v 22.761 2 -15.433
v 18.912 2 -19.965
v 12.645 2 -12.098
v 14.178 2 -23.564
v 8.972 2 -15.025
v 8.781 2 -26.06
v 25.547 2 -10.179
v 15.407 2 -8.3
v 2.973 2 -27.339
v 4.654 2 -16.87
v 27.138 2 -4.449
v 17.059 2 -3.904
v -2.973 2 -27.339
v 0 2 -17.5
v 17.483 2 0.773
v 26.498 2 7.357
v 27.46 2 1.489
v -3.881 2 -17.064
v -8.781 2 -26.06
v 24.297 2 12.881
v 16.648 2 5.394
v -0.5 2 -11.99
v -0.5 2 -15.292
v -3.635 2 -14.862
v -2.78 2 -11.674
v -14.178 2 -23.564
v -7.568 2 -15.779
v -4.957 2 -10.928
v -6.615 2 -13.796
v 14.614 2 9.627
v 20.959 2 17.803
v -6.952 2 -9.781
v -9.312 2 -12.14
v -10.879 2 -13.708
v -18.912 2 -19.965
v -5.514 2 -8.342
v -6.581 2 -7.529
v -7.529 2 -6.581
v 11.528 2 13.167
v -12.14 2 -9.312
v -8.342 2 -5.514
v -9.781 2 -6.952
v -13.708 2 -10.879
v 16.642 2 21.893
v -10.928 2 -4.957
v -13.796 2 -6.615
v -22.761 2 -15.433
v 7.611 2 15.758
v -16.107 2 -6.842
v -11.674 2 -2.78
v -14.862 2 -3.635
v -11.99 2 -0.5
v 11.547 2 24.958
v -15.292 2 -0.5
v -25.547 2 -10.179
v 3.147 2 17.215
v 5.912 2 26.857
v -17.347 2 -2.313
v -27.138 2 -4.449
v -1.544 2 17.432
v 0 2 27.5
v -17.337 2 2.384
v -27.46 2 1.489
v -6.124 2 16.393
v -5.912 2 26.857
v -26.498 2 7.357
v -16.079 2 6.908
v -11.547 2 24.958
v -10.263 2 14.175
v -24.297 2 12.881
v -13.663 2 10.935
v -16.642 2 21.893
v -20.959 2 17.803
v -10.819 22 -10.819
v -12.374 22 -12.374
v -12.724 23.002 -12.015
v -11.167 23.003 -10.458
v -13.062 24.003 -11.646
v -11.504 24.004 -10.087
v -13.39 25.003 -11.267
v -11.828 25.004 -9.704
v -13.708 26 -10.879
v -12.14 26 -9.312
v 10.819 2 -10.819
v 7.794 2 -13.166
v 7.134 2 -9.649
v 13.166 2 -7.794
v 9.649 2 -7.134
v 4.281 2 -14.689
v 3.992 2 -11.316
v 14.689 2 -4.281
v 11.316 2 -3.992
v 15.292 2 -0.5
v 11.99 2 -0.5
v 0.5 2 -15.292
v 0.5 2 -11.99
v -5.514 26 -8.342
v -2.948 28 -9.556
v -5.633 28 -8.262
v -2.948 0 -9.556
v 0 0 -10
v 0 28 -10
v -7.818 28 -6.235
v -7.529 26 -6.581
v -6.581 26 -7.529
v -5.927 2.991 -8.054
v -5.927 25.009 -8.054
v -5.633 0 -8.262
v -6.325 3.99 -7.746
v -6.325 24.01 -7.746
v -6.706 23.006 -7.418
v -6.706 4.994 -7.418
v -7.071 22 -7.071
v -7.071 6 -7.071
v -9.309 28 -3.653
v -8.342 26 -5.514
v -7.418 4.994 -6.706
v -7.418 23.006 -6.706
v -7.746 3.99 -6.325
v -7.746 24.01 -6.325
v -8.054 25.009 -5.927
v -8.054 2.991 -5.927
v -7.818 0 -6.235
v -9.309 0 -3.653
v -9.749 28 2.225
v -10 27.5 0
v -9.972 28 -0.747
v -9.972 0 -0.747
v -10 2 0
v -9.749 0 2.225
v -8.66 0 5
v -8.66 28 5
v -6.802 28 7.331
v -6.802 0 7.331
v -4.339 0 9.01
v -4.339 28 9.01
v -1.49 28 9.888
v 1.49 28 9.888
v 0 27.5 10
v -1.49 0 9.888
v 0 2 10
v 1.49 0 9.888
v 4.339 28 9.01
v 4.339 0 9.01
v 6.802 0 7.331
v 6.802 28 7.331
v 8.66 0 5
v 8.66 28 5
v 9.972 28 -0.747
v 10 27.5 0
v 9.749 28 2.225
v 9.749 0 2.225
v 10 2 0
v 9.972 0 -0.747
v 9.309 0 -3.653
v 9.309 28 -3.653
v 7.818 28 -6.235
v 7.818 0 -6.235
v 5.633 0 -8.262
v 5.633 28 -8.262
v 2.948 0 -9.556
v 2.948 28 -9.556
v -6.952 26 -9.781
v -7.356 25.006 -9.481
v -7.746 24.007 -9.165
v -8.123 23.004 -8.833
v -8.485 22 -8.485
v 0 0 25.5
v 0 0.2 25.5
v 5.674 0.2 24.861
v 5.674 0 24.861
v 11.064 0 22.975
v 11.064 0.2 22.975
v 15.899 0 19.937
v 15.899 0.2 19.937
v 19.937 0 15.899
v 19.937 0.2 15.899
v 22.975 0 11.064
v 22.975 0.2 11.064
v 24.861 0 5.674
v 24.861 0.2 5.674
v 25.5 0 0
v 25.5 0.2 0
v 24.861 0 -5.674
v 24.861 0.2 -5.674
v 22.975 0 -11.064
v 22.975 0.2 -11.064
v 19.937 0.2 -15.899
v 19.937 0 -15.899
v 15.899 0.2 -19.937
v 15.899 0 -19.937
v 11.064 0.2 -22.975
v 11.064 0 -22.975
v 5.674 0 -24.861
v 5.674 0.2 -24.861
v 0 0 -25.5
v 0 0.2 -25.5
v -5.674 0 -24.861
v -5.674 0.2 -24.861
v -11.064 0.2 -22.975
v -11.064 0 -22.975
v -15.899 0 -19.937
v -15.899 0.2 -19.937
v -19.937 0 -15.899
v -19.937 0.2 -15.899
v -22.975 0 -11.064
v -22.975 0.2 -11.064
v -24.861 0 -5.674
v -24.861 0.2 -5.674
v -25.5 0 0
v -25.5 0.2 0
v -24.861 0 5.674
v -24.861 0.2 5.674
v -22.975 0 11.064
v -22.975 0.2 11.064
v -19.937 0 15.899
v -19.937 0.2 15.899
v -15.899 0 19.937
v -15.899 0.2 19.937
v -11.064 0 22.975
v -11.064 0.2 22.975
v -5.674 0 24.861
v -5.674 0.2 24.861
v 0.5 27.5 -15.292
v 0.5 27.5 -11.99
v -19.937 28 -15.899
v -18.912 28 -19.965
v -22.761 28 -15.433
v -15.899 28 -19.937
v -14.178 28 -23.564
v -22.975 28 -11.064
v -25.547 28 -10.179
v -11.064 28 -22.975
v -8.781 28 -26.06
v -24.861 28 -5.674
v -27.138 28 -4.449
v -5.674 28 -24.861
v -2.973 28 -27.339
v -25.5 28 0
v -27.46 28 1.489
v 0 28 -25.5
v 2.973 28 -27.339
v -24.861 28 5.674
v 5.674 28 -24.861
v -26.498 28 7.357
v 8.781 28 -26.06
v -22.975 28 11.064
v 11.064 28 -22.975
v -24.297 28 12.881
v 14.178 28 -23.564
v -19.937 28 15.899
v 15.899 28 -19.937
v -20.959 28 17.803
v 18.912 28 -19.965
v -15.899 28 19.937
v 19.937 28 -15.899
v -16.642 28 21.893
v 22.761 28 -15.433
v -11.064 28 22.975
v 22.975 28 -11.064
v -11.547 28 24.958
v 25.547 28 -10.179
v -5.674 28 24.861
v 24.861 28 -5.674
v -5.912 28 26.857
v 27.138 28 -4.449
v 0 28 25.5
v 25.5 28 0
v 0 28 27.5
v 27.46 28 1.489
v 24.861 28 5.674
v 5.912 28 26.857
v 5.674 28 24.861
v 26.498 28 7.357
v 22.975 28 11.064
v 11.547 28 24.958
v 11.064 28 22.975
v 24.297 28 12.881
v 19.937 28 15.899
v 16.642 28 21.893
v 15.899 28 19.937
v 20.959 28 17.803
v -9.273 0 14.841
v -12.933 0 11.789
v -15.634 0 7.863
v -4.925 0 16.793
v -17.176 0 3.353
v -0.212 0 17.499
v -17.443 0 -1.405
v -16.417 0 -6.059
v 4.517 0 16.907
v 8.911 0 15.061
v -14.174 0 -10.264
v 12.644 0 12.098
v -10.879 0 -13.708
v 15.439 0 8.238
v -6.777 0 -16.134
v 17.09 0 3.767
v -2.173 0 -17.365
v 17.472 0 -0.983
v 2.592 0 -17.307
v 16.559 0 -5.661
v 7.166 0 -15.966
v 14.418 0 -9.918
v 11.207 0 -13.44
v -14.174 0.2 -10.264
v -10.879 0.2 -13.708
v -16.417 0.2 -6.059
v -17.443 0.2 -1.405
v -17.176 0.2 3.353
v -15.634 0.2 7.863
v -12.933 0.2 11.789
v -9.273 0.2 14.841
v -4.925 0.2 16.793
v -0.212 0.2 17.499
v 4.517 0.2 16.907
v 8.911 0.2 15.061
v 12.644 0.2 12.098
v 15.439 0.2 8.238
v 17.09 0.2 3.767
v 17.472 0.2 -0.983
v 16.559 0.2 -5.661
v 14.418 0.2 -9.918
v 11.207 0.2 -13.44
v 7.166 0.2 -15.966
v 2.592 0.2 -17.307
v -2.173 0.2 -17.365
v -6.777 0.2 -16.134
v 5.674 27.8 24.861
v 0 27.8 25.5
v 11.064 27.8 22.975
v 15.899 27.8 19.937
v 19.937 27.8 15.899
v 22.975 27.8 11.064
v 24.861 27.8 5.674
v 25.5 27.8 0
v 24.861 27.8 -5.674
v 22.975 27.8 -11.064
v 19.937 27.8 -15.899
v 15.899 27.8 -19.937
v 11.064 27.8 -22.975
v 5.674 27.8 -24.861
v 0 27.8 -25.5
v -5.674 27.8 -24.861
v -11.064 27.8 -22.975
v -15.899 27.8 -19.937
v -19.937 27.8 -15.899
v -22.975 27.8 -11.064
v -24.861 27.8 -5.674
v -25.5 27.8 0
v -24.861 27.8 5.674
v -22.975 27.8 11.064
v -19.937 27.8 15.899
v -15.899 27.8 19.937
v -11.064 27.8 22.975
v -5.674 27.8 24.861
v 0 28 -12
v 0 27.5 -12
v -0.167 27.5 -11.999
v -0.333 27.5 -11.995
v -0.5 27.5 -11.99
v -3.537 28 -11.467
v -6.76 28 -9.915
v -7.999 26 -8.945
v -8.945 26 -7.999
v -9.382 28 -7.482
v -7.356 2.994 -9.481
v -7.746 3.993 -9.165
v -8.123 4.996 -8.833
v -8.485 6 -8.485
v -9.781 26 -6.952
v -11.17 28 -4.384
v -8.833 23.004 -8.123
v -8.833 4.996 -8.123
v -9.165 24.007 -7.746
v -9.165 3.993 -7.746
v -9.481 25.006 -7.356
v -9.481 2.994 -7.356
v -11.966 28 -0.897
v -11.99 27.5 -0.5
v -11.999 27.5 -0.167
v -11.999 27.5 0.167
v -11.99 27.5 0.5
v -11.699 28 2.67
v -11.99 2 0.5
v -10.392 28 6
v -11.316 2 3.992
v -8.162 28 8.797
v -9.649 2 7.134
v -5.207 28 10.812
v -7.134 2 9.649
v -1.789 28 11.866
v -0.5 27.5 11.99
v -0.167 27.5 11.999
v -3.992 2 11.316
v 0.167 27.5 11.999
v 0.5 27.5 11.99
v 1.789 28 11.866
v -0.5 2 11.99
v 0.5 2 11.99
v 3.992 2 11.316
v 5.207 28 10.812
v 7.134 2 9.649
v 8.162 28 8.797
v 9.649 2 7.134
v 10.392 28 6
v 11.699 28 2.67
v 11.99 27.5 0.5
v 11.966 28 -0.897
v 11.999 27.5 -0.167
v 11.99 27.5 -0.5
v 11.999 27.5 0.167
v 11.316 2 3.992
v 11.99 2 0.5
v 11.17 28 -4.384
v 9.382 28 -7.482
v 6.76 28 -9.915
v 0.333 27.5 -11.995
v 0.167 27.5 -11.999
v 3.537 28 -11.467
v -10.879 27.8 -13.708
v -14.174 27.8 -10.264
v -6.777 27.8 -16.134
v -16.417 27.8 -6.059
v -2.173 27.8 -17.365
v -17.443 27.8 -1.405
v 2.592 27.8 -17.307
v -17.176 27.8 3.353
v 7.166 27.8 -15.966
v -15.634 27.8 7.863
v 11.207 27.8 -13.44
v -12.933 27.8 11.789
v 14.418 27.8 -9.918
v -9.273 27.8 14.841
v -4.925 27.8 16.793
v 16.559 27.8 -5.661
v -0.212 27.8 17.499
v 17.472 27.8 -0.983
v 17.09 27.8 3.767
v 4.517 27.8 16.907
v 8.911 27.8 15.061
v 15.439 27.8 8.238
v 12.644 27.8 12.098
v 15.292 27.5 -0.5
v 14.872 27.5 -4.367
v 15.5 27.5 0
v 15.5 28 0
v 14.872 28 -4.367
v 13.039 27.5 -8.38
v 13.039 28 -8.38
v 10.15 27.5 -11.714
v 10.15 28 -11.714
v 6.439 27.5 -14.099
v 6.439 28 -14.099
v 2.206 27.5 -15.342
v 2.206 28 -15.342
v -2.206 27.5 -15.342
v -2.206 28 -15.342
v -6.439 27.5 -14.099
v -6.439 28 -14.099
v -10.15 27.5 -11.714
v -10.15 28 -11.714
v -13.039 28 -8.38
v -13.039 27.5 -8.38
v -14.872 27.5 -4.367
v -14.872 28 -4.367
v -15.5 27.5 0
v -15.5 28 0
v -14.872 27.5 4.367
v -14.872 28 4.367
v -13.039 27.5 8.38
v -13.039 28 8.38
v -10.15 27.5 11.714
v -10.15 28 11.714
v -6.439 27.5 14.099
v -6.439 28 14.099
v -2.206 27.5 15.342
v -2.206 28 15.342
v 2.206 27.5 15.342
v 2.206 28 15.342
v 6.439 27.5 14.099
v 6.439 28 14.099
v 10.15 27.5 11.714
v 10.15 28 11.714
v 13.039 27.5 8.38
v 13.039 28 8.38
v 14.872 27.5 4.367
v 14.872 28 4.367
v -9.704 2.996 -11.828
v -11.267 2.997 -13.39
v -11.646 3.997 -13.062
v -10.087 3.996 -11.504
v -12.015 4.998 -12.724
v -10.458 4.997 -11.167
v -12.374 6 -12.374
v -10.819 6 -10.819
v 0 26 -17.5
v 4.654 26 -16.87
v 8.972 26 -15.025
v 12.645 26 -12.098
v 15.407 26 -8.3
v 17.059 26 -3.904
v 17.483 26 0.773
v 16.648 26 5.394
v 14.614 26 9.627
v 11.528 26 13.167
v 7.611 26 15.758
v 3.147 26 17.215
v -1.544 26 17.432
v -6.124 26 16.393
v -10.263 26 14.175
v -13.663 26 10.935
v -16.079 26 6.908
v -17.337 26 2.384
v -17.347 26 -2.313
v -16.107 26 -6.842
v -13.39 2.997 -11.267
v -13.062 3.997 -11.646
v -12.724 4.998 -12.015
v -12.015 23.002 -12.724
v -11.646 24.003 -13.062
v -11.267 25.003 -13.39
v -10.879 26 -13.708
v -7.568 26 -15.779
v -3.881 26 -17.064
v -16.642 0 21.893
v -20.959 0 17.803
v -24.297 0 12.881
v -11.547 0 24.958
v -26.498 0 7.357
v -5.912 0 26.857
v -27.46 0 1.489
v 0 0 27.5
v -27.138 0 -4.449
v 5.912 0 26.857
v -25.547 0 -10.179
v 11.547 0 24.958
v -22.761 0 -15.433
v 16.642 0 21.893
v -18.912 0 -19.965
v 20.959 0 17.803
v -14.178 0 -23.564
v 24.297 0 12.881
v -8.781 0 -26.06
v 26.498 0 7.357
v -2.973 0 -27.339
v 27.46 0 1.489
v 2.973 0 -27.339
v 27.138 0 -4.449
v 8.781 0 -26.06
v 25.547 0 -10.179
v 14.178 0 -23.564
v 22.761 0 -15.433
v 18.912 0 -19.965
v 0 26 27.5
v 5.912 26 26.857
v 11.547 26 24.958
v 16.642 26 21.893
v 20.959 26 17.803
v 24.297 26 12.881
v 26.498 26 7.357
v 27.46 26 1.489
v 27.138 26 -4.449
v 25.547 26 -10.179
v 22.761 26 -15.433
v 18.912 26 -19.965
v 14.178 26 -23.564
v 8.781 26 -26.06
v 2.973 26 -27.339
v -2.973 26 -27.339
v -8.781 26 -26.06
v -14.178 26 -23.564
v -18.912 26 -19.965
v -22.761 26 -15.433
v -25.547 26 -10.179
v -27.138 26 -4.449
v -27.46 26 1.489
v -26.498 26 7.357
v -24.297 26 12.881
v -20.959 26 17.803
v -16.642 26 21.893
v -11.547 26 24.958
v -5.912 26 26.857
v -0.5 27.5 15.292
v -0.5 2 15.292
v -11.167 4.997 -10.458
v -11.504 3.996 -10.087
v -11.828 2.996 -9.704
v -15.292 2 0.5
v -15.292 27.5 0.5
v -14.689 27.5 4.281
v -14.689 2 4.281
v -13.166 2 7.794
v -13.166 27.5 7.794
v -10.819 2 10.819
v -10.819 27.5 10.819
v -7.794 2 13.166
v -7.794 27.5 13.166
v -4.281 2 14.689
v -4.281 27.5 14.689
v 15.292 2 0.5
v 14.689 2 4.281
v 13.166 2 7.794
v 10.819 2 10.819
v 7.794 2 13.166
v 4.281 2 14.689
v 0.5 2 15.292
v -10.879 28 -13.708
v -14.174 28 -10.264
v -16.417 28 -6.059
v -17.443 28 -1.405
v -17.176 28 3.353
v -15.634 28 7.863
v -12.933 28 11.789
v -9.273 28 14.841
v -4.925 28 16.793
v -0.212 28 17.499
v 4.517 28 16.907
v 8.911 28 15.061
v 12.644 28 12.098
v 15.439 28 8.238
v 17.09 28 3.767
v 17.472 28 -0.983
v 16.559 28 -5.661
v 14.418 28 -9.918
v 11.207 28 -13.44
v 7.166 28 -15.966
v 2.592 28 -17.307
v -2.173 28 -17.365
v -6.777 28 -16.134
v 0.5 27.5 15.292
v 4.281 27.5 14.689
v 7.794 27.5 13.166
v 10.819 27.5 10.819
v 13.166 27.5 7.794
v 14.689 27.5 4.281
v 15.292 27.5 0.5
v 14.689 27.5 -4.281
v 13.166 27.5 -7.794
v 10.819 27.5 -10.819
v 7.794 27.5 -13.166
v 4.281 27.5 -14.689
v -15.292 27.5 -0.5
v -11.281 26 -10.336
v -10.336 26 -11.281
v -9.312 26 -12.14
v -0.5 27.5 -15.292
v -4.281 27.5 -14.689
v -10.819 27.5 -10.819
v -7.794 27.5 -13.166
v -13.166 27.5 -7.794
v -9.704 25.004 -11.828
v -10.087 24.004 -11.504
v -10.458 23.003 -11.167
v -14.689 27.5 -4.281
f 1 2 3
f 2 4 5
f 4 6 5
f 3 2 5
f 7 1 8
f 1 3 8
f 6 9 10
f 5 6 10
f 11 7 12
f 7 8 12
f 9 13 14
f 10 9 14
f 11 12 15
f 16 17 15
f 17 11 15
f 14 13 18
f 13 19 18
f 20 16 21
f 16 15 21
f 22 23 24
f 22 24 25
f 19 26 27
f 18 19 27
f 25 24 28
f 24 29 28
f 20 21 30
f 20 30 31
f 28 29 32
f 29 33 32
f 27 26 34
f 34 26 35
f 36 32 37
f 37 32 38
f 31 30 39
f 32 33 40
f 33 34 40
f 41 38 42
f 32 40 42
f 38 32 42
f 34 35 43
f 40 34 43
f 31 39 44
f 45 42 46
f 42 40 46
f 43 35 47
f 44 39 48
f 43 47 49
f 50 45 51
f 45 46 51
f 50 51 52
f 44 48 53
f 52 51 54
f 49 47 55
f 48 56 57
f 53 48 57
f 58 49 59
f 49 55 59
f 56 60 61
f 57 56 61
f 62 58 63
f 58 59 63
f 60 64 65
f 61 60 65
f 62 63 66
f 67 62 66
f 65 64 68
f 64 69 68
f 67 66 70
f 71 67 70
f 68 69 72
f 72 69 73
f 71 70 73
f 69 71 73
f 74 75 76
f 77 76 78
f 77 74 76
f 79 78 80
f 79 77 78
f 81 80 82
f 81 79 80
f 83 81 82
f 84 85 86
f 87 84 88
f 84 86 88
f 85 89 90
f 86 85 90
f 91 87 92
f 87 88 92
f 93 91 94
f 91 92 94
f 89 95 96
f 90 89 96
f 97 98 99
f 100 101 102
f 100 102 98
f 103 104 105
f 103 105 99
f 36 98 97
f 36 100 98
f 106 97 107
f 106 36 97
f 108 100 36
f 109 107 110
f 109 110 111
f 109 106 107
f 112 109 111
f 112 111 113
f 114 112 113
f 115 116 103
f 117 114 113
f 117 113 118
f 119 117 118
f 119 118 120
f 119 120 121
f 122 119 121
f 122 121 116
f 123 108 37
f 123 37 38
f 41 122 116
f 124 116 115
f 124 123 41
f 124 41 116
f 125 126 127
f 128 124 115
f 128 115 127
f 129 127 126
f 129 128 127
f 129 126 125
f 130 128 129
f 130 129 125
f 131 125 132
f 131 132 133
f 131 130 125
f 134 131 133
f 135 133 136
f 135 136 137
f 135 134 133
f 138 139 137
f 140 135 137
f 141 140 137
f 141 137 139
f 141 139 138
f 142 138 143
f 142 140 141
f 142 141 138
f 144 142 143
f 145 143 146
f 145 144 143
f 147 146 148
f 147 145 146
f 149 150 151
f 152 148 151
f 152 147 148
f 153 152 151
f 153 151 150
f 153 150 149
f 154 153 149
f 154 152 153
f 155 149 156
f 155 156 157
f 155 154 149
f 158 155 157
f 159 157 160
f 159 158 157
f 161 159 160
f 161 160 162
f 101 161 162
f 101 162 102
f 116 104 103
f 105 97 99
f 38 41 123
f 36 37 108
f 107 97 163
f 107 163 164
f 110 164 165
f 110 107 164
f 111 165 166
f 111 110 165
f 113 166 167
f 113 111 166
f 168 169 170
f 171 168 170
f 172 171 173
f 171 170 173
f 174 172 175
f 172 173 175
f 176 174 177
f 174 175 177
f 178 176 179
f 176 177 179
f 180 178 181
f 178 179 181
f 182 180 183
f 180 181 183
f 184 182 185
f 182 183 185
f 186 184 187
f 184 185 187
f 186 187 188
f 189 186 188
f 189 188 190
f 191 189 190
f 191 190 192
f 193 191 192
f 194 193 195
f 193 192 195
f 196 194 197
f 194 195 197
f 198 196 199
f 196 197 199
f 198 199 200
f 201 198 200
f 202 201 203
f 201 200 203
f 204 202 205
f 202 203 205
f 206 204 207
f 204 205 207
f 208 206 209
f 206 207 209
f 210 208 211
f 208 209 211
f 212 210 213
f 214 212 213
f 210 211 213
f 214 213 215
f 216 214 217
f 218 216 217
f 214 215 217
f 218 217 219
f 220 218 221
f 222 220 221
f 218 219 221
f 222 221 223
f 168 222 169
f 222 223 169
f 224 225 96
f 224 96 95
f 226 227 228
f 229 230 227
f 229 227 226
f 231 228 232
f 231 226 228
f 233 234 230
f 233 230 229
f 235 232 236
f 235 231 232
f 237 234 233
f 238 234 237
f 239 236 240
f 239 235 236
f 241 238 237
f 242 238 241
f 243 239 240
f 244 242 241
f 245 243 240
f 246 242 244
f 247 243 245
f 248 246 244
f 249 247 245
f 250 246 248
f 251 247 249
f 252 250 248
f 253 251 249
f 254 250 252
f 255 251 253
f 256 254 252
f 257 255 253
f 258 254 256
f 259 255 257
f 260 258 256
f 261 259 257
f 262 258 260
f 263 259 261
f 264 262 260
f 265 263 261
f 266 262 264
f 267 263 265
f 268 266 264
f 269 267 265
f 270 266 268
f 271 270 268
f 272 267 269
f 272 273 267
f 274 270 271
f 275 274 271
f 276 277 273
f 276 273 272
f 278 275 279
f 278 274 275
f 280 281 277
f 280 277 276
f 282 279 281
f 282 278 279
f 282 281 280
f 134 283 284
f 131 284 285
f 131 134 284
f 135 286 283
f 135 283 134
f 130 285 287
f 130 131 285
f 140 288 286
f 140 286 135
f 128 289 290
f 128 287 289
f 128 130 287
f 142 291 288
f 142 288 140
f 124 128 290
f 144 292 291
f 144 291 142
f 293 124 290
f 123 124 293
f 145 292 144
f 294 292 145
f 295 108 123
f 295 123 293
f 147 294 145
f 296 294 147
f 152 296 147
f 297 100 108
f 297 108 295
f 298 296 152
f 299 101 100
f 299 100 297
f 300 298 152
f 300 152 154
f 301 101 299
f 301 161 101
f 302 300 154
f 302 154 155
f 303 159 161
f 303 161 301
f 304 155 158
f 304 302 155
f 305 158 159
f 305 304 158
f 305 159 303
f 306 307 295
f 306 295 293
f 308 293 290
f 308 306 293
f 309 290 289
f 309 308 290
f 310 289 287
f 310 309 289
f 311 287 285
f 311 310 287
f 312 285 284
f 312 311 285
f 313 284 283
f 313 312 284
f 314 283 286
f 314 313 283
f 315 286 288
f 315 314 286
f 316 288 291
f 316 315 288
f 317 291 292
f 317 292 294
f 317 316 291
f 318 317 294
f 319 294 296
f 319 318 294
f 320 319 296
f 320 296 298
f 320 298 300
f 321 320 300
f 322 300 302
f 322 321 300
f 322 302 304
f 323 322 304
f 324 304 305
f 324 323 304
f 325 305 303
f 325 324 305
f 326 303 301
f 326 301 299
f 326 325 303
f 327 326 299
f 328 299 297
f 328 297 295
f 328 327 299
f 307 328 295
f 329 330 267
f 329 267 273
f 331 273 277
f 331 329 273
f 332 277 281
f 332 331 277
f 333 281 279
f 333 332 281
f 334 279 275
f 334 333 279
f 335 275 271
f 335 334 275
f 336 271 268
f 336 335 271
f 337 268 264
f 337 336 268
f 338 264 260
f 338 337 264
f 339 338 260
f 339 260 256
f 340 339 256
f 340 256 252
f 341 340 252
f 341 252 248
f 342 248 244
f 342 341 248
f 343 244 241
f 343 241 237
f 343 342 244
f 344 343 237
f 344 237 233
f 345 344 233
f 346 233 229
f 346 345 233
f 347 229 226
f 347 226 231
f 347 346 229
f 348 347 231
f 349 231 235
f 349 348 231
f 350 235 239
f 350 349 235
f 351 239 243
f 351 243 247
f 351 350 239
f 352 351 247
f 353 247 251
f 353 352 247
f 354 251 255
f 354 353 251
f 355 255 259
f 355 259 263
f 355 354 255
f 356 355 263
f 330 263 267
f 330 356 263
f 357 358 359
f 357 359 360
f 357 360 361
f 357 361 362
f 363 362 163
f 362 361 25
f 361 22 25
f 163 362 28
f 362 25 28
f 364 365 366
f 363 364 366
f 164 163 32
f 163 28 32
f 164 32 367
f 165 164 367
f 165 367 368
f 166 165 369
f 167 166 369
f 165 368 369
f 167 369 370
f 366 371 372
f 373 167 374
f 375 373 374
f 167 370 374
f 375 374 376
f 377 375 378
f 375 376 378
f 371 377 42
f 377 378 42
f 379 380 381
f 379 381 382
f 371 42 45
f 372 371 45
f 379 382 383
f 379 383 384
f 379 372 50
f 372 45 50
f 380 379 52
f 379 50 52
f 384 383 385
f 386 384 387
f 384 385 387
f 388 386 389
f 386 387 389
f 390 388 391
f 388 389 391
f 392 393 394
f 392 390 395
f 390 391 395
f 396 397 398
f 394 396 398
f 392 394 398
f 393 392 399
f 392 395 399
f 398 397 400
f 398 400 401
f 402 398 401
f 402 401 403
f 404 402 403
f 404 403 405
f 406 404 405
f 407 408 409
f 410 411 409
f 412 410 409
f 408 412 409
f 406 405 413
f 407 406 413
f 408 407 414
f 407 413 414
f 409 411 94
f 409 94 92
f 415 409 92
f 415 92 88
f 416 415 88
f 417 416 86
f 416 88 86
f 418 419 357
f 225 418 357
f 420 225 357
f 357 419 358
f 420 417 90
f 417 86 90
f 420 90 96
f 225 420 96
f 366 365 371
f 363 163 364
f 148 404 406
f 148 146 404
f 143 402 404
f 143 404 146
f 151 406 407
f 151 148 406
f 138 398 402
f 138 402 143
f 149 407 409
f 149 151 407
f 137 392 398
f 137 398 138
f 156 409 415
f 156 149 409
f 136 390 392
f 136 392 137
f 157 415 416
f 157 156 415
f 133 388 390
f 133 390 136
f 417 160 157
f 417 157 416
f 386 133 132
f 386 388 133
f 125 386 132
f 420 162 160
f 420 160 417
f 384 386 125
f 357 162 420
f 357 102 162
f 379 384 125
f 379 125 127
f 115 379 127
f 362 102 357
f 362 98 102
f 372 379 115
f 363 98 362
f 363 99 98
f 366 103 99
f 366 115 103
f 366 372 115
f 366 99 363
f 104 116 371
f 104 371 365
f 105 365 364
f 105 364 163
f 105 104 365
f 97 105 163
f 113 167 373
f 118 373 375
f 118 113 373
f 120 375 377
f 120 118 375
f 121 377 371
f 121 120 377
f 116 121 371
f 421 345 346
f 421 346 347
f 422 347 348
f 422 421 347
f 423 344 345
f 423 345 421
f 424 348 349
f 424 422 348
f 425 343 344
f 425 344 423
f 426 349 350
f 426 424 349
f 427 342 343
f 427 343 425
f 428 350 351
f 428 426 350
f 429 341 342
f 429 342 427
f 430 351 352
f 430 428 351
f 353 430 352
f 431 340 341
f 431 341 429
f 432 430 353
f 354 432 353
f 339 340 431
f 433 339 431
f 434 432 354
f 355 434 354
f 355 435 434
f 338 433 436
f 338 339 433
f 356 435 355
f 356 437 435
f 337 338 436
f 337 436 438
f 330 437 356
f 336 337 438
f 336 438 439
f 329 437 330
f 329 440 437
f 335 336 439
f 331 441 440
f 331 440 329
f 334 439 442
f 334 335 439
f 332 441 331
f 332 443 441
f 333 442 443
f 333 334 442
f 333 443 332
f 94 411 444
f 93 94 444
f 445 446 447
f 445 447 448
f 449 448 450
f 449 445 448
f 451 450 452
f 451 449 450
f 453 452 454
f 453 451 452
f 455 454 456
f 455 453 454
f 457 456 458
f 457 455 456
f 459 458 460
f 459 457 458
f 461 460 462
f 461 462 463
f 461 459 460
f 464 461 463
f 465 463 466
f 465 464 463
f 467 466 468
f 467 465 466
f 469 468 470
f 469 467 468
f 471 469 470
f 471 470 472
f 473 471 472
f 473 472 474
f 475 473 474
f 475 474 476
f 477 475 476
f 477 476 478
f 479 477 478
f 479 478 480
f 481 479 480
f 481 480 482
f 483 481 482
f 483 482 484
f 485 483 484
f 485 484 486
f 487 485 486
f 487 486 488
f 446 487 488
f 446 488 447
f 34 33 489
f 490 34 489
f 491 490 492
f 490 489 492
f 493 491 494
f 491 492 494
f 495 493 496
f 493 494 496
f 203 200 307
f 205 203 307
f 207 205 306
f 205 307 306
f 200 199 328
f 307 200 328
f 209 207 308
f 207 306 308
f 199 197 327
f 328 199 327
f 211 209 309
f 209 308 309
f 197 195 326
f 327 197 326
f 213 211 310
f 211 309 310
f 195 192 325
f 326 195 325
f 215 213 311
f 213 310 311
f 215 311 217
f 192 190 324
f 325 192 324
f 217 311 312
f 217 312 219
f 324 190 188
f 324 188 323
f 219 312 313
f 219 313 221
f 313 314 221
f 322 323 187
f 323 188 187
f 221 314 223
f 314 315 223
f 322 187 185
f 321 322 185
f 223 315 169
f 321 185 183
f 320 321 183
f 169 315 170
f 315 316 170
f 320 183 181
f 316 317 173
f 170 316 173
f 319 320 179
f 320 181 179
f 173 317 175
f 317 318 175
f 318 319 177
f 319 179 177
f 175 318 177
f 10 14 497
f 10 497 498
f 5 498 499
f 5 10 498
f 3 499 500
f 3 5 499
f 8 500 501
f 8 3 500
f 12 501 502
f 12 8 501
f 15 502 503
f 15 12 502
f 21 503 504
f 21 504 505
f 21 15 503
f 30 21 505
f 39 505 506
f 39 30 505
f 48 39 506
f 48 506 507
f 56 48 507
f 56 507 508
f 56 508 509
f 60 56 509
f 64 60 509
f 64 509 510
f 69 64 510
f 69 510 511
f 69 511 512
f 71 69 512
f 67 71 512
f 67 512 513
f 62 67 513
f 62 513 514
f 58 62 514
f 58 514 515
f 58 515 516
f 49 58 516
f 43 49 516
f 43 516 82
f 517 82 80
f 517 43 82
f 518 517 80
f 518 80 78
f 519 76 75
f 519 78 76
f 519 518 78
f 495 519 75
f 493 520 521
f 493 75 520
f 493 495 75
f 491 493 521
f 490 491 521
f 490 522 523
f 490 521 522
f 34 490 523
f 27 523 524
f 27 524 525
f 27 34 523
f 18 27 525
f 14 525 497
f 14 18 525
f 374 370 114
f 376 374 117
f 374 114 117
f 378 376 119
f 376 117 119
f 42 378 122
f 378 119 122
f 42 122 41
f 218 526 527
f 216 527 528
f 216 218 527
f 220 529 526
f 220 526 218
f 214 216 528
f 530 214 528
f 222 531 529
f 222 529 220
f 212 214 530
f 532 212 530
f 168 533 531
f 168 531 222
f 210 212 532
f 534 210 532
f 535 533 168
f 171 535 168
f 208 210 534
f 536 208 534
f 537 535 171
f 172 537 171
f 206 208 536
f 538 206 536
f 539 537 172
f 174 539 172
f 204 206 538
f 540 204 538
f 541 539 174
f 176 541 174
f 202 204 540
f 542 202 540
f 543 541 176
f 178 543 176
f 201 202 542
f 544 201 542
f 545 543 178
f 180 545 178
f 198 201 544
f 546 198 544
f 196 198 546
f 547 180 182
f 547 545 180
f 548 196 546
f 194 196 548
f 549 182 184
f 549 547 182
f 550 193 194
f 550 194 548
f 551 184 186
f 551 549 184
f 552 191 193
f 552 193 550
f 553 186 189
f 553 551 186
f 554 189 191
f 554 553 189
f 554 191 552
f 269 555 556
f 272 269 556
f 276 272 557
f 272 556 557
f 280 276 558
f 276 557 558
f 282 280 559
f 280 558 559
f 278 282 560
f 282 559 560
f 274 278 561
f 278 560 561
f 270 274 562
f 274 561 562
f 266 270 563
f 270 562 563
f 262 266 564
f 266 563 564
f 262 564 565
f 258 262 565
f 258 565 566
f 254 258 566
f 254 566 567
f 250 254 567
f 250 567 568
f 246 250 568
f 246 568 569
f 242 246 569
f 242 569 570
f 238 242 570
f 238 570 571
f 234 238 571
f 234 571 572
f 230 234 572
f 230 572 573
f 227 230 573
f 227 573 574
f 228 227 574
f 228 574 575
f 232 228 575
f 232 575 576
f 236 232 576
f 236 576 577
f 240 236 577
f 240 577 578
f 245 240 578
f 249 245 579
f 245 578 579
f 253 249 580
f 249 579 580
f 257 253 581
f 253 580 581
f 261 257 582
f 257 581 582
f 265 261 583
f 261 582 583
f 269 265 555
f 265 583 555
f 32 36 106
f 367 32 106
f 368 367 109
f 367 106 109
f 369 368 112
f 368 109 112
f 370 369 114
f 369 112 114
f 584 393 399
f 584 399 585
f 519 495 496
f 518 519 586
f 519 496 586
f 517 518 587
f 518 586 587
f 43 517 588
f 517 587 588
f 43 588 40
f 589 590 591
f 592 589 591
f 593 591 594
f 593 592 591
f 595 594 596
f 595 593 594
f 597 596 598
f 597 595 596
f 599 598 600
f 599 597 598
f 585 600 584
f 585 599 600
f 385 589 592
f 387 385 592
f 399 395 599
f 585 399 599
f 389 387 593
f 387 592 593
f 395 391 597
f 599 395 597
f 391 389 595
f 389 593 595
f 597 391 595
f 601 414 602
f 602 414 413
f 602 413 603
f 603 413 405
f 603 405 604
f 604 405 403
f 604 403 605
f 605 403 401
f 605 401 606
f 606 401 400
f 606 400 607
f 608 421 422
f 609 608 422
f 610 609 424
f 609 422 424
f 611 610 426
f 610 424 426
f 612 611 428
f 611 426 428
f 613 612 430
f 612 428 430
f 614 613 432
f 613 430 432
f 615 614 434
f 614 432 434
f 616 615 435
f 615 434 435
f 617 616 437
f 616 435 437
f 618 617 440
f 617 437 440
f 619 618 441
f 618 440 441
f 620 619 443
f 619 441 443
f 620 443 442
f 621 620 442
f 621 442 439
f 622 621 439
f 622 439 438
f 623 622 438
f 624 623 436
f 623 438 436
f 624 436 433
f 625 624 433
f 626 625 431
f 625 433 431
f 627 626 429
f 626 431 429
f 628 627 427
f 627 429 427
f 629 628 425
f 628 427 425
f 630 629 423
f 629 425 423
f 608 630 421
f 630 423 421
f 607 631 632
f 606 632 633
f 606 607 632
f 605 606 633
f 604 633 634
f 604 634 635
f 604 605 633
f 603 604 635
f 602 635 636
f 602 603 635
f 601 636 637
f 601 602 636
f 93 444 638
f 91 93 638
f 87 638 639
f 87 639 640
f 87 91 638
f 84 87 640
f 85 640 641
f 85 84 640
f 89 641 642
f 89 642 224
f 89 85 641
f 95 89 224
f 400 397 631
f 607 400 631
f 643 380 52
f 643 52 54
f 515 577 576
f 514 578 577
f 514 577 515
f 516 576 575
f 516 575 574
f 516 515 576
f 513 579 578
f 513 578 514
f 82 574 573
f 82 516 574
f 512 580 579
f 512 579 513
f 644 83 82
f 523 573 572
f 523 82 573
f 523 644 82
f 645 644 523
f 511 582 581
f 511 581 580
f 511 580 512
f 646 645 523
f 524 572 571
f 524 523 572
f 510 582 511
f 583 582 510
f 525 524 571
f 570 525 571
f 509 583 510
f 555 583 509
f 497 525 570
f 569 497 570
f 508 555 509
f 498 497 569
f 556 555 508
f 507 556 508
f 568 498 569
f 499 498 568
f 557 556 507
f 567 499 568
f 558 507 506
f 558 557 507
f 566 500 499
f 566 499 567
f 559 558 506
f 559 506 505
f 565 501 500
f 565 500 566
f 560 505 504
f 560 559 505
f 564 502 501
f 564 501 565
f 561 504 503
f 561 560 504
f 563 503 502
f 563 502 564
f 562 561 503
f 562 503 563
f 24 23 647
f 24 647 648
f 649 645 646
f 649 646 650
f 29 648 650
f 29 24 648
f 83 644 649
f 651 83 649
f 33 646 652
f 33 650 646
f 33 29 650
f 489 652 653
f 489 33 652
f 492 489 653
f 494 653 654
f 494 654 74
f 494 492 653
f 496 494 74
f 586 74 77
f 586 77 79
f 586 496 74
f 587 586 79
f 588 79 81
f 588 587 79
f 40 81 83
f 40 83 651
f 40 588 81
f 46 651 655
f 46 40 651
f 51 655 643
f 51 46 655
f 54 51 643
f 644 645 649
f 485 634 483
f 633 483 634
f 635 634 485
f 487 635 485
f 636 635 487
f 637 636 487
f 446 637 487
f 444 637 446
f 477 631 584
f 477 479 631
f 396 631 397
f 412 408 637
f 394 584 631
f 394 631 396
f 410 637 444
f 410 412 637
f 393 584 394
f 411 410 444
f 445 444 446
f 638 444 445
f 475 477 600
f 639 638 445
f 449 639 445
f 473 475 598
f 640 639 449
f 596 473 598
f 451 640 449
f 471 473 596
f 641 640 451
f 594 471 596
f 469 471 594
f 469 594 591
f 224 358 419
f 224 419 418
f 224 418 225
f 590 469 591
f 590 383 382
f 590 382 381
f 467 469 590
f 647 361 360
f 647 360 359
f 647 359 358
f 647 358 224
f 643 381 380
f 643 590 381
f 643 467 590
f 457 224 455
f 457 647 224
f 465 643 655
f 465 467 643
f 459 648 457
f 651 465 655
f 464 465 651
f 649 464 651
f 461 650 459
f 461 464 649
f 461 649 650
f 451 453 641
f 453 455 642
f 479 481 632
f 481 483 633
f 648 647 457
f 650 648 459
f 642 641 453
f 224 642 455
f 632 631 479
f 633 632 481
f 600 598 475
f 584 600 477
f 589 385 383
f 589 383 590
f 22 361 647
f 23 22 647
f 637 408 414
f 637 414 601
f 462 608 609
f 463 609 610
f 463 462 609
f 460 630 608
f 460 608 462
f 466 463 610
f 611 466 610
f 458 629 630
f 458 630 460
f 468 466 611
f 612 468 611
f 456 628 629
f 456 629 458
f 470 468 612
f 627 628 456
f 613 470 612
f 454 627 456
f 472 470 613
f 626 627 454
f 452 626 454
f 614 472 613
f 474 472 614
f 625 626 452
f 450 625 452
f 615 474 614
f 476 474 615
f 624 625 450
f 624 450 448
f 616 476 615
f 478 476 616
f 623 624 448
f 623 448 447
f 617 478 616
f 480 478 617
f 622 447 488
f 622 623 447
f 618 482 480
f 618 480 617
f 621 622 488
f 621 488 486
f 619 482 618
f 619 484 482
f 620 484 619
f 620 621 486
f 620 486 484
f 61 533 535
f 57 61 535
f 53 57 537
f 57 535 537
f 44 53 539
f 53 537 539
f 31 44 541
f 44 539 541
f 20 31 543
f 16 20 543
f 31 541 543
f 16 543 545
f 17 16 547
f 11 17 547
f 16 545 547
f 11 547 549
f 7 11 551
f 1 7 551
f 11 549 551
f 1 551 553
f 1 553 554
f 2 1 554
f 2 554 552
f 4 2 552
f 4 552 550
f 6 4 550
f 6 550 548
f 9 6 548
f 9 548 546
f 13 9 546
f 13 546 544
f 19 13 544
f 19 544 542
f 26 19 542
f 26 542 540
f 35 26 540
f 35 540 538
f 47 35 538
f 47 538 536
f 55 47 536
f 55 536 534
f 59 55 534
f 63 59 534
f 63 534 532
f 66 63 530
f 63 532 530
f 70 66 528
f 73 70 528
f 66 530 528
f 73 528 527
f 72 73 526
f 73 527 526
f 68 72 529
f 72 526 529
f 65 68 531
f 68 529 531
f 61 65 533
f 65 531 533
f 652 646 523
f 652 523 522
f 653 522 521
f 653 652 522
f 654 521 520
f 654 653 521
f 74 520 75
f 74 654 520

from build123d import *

# Parameters (mm, degrees)
SKETCH_1_R               = 27.5
EXTRUDE_1_DEPTH          = 2
SKETCH_2_R               = 17.5
EXTRUDE_4_DEPTH          = 28
EXTRUDE_START            = -2
SKETCH_4_R               = 27.5
EXTRUDE_5_DEPTH          = 2
SHELL_1_OUTLINE_R        = 15.5
SHELL_1_DEPTH            = 28
SKETCH_5_R               = 27.5
SKETCH_5_R_2             = 10
EXTRUDE_6_DEPTH          = 2
SKETCH_6_R               = 12
SKETCH_6_R_2             = 10
EXTRUDE_7_DEPTH          = 26
RIB_START                = -0.5
RIB_1_OUTLINE_W          = 7
RIB_1_OUTLINE_H          = 25.5
RIB_1_DEPTH              = 1
PATTERN_CIRCULAR_1_COUNT = 4
SKETCH_9_R               = 15.5
SKETCH_9_R_2             = 15.3
EXTRUDE_8_DEPTH          = 25.5
CUT_EXTRUDE_2_DEPTH      = 48.921811318
CUT_EXTRUDE_START        = -0.2
SKETCH_10_R              = 25.5
SKETCH_10_R_2            = 17.5
CUT_EXTRUDE_3_DEPTH      = 0.2


# Read off the part's stored shape, not the designer's step: 抽壳1, 筋1
with BuildPart() as part:
    # 草图1 → 凸台-拉伸1 (new body)
    with BuildSketch(Plane(origin=(0, 0, 0), x_dir=(1, 0, 0), z_dir=(0, 1, 0))):
        with Locations(Location((0, 0, 0), (0, 0, 270))):
            Circle(SKETCH_1_R)
    extrude(amount=EXTRUDE_1_DEPTH)

    # 草图2 → 凸台-拉伸4 (add)
    with BuildSketch(Plane.XZ):
        with Locations(Location((0, 0, 0), (0, 0, 270))):
            Circle(SKETCH_2_R)
    extrude(amount=-EXTRUDE_4_DEPTH)

    # 草图4 → 凸台-拉伸5 (add)
    with BuildSketch(Plane(origin=(0, 28, 0), x_dir=(1, 0, 0), z_dir=(0, 1, 0)).offset(EXTRUDE_START)):
        with Locations(Location((0, 0, 0), (0, 0, 270))):
            Circle(SKETCH_4_R)
    extrude(amount=EXTRUDE_5_DEPTH)

    # 抽壳1 outline → 抽壳1 (cut)
    with BuildSketch(Plane(origin=(0, 0, 0), x_dir=(1, 0, 0), z_dir=(0, 1, 0))):
        Circle(SHELL_1_OUTLINE_R)
    extrude(amount=SHELL_1_DEPTH, mode=Mode.SUBTRACT)

    # 草图5 → 凸台-拉伸6 (add)
    with BuildSketch(Plane.XZ):
        with Locations(Location((0, 0, 0), (0, 0, 90))):
            Circle(SKETCH_5_R)
        with Locations(Location((0, 0, 0), (0, 0, 270))):
            Circle(SKETCH_5_R_2, mode=Mode.SUBTRACT)
    extrude(amount=-EXTRUDE_6_DEPTH)

    # 草图6 → 凸台-拉伸7 (add)
    with BuildSketch(Plane(origin=(0, 2, 0), x_dir=(1, 0, 0), z_dir=(0, 1, 0))):
        with Locations(Location((0, 0, 0), (0, 0, 90))):
            Circle(SKETCH_6_R)
        with Locations(Location((0, 0, 0), (0, 0, 90))):
            Circle(SKETCH_6_R_2, mode=Mode.SUBTRACT)
    extrude(amount=EXTRUDE_7_DEPTH)

    # 筋1 outline → 筋1 (add)
    with BuildSketch(Plane.XY.offset(RIB_START)):
        with Locations((13.5, 14.75)):
            Rectangle(RIB_1_OUTLINE_W, RIB_1_OUTLINE_H)
    rib_1 = extrude(amount=RIB_1_DEPTH)

    # 阵列(圆周)1: 筋1 ×4 about axis
    pattern_circular_1_axis = Axis((0, 0, 0), (0, 1, 0))
    for i in range(1, PATTERN_CIRCULAR_1_COUNT):
        add(rib_1.rotate(pattern_circular_1_axis, i * 360 / PATTERN_CIRCULAR_1_COUNT))

    # 草图9 → 凸台-拉伸8 (add)
    with BuildSketch(Plane(origin=(0, 2, 0), x_dir=(1, 0, 0), z_dir=(0, 1, 0))):
        with Locations(Location((0, 0, 0), (0, 0, 90))):
            Circle(SKETCH_9_R)
        Circle(SKETCH_9_R_2, mode=Mode.SUBTRACT)
    extrude(amount=EXTRUDE_8_DEPTH)

    # 草图8 → 切除-拉伸2 (cut, through all)
    with BuildSketch(Plane(origin=(0, 0, 0), x_dir=(0, 1, 0), z_dir=(0.7071067811865488, 0, 0.7071067811865464))):
        Polygon((26, 2), (26, -2), (22, 0), align=None)
    cut_extrude_2 = extrude(amount=-CUT_EXTRUDE_2_DEPTH, mode=Mode.SUBTRACT)

    # 镜向2: 切除-拉伸2 across plane
    add(cut_extrude_2.mirror(Plane.ZX.offset(14)), mode=Mode.SUBTRACT)

    # 草图10 → 切除-拉伸3 (cut)
    with BuildSketch(Plane(origin=(0, 28, 0), x_dir=(1, 0, 0), z_dir=(0, 1, 0)).offset(CUT_EXTRUDE_START)):
        with Locations(Location((0, 0, 0), (0, 0, 270))):
            Circle(SKETCH_10_R)
        with Locations(Location((0, 0, 0), (0, 0, 128.437572131))):
            Circle(SKETCH_10_R_2, mode=Mode.SUBTRACT)
    cut_extrude_3 = extrude(amount=CUT_EXTRUDE_3_DEPTH, mode=Mode.SUBTRACT)

    # 镜向3: 切除-拉伸3 across plane
    add(cut_extrude_3.mirror(Plane.ZX.offset(14)), mode=Mode.SUBTRACT)


solid = part.part
